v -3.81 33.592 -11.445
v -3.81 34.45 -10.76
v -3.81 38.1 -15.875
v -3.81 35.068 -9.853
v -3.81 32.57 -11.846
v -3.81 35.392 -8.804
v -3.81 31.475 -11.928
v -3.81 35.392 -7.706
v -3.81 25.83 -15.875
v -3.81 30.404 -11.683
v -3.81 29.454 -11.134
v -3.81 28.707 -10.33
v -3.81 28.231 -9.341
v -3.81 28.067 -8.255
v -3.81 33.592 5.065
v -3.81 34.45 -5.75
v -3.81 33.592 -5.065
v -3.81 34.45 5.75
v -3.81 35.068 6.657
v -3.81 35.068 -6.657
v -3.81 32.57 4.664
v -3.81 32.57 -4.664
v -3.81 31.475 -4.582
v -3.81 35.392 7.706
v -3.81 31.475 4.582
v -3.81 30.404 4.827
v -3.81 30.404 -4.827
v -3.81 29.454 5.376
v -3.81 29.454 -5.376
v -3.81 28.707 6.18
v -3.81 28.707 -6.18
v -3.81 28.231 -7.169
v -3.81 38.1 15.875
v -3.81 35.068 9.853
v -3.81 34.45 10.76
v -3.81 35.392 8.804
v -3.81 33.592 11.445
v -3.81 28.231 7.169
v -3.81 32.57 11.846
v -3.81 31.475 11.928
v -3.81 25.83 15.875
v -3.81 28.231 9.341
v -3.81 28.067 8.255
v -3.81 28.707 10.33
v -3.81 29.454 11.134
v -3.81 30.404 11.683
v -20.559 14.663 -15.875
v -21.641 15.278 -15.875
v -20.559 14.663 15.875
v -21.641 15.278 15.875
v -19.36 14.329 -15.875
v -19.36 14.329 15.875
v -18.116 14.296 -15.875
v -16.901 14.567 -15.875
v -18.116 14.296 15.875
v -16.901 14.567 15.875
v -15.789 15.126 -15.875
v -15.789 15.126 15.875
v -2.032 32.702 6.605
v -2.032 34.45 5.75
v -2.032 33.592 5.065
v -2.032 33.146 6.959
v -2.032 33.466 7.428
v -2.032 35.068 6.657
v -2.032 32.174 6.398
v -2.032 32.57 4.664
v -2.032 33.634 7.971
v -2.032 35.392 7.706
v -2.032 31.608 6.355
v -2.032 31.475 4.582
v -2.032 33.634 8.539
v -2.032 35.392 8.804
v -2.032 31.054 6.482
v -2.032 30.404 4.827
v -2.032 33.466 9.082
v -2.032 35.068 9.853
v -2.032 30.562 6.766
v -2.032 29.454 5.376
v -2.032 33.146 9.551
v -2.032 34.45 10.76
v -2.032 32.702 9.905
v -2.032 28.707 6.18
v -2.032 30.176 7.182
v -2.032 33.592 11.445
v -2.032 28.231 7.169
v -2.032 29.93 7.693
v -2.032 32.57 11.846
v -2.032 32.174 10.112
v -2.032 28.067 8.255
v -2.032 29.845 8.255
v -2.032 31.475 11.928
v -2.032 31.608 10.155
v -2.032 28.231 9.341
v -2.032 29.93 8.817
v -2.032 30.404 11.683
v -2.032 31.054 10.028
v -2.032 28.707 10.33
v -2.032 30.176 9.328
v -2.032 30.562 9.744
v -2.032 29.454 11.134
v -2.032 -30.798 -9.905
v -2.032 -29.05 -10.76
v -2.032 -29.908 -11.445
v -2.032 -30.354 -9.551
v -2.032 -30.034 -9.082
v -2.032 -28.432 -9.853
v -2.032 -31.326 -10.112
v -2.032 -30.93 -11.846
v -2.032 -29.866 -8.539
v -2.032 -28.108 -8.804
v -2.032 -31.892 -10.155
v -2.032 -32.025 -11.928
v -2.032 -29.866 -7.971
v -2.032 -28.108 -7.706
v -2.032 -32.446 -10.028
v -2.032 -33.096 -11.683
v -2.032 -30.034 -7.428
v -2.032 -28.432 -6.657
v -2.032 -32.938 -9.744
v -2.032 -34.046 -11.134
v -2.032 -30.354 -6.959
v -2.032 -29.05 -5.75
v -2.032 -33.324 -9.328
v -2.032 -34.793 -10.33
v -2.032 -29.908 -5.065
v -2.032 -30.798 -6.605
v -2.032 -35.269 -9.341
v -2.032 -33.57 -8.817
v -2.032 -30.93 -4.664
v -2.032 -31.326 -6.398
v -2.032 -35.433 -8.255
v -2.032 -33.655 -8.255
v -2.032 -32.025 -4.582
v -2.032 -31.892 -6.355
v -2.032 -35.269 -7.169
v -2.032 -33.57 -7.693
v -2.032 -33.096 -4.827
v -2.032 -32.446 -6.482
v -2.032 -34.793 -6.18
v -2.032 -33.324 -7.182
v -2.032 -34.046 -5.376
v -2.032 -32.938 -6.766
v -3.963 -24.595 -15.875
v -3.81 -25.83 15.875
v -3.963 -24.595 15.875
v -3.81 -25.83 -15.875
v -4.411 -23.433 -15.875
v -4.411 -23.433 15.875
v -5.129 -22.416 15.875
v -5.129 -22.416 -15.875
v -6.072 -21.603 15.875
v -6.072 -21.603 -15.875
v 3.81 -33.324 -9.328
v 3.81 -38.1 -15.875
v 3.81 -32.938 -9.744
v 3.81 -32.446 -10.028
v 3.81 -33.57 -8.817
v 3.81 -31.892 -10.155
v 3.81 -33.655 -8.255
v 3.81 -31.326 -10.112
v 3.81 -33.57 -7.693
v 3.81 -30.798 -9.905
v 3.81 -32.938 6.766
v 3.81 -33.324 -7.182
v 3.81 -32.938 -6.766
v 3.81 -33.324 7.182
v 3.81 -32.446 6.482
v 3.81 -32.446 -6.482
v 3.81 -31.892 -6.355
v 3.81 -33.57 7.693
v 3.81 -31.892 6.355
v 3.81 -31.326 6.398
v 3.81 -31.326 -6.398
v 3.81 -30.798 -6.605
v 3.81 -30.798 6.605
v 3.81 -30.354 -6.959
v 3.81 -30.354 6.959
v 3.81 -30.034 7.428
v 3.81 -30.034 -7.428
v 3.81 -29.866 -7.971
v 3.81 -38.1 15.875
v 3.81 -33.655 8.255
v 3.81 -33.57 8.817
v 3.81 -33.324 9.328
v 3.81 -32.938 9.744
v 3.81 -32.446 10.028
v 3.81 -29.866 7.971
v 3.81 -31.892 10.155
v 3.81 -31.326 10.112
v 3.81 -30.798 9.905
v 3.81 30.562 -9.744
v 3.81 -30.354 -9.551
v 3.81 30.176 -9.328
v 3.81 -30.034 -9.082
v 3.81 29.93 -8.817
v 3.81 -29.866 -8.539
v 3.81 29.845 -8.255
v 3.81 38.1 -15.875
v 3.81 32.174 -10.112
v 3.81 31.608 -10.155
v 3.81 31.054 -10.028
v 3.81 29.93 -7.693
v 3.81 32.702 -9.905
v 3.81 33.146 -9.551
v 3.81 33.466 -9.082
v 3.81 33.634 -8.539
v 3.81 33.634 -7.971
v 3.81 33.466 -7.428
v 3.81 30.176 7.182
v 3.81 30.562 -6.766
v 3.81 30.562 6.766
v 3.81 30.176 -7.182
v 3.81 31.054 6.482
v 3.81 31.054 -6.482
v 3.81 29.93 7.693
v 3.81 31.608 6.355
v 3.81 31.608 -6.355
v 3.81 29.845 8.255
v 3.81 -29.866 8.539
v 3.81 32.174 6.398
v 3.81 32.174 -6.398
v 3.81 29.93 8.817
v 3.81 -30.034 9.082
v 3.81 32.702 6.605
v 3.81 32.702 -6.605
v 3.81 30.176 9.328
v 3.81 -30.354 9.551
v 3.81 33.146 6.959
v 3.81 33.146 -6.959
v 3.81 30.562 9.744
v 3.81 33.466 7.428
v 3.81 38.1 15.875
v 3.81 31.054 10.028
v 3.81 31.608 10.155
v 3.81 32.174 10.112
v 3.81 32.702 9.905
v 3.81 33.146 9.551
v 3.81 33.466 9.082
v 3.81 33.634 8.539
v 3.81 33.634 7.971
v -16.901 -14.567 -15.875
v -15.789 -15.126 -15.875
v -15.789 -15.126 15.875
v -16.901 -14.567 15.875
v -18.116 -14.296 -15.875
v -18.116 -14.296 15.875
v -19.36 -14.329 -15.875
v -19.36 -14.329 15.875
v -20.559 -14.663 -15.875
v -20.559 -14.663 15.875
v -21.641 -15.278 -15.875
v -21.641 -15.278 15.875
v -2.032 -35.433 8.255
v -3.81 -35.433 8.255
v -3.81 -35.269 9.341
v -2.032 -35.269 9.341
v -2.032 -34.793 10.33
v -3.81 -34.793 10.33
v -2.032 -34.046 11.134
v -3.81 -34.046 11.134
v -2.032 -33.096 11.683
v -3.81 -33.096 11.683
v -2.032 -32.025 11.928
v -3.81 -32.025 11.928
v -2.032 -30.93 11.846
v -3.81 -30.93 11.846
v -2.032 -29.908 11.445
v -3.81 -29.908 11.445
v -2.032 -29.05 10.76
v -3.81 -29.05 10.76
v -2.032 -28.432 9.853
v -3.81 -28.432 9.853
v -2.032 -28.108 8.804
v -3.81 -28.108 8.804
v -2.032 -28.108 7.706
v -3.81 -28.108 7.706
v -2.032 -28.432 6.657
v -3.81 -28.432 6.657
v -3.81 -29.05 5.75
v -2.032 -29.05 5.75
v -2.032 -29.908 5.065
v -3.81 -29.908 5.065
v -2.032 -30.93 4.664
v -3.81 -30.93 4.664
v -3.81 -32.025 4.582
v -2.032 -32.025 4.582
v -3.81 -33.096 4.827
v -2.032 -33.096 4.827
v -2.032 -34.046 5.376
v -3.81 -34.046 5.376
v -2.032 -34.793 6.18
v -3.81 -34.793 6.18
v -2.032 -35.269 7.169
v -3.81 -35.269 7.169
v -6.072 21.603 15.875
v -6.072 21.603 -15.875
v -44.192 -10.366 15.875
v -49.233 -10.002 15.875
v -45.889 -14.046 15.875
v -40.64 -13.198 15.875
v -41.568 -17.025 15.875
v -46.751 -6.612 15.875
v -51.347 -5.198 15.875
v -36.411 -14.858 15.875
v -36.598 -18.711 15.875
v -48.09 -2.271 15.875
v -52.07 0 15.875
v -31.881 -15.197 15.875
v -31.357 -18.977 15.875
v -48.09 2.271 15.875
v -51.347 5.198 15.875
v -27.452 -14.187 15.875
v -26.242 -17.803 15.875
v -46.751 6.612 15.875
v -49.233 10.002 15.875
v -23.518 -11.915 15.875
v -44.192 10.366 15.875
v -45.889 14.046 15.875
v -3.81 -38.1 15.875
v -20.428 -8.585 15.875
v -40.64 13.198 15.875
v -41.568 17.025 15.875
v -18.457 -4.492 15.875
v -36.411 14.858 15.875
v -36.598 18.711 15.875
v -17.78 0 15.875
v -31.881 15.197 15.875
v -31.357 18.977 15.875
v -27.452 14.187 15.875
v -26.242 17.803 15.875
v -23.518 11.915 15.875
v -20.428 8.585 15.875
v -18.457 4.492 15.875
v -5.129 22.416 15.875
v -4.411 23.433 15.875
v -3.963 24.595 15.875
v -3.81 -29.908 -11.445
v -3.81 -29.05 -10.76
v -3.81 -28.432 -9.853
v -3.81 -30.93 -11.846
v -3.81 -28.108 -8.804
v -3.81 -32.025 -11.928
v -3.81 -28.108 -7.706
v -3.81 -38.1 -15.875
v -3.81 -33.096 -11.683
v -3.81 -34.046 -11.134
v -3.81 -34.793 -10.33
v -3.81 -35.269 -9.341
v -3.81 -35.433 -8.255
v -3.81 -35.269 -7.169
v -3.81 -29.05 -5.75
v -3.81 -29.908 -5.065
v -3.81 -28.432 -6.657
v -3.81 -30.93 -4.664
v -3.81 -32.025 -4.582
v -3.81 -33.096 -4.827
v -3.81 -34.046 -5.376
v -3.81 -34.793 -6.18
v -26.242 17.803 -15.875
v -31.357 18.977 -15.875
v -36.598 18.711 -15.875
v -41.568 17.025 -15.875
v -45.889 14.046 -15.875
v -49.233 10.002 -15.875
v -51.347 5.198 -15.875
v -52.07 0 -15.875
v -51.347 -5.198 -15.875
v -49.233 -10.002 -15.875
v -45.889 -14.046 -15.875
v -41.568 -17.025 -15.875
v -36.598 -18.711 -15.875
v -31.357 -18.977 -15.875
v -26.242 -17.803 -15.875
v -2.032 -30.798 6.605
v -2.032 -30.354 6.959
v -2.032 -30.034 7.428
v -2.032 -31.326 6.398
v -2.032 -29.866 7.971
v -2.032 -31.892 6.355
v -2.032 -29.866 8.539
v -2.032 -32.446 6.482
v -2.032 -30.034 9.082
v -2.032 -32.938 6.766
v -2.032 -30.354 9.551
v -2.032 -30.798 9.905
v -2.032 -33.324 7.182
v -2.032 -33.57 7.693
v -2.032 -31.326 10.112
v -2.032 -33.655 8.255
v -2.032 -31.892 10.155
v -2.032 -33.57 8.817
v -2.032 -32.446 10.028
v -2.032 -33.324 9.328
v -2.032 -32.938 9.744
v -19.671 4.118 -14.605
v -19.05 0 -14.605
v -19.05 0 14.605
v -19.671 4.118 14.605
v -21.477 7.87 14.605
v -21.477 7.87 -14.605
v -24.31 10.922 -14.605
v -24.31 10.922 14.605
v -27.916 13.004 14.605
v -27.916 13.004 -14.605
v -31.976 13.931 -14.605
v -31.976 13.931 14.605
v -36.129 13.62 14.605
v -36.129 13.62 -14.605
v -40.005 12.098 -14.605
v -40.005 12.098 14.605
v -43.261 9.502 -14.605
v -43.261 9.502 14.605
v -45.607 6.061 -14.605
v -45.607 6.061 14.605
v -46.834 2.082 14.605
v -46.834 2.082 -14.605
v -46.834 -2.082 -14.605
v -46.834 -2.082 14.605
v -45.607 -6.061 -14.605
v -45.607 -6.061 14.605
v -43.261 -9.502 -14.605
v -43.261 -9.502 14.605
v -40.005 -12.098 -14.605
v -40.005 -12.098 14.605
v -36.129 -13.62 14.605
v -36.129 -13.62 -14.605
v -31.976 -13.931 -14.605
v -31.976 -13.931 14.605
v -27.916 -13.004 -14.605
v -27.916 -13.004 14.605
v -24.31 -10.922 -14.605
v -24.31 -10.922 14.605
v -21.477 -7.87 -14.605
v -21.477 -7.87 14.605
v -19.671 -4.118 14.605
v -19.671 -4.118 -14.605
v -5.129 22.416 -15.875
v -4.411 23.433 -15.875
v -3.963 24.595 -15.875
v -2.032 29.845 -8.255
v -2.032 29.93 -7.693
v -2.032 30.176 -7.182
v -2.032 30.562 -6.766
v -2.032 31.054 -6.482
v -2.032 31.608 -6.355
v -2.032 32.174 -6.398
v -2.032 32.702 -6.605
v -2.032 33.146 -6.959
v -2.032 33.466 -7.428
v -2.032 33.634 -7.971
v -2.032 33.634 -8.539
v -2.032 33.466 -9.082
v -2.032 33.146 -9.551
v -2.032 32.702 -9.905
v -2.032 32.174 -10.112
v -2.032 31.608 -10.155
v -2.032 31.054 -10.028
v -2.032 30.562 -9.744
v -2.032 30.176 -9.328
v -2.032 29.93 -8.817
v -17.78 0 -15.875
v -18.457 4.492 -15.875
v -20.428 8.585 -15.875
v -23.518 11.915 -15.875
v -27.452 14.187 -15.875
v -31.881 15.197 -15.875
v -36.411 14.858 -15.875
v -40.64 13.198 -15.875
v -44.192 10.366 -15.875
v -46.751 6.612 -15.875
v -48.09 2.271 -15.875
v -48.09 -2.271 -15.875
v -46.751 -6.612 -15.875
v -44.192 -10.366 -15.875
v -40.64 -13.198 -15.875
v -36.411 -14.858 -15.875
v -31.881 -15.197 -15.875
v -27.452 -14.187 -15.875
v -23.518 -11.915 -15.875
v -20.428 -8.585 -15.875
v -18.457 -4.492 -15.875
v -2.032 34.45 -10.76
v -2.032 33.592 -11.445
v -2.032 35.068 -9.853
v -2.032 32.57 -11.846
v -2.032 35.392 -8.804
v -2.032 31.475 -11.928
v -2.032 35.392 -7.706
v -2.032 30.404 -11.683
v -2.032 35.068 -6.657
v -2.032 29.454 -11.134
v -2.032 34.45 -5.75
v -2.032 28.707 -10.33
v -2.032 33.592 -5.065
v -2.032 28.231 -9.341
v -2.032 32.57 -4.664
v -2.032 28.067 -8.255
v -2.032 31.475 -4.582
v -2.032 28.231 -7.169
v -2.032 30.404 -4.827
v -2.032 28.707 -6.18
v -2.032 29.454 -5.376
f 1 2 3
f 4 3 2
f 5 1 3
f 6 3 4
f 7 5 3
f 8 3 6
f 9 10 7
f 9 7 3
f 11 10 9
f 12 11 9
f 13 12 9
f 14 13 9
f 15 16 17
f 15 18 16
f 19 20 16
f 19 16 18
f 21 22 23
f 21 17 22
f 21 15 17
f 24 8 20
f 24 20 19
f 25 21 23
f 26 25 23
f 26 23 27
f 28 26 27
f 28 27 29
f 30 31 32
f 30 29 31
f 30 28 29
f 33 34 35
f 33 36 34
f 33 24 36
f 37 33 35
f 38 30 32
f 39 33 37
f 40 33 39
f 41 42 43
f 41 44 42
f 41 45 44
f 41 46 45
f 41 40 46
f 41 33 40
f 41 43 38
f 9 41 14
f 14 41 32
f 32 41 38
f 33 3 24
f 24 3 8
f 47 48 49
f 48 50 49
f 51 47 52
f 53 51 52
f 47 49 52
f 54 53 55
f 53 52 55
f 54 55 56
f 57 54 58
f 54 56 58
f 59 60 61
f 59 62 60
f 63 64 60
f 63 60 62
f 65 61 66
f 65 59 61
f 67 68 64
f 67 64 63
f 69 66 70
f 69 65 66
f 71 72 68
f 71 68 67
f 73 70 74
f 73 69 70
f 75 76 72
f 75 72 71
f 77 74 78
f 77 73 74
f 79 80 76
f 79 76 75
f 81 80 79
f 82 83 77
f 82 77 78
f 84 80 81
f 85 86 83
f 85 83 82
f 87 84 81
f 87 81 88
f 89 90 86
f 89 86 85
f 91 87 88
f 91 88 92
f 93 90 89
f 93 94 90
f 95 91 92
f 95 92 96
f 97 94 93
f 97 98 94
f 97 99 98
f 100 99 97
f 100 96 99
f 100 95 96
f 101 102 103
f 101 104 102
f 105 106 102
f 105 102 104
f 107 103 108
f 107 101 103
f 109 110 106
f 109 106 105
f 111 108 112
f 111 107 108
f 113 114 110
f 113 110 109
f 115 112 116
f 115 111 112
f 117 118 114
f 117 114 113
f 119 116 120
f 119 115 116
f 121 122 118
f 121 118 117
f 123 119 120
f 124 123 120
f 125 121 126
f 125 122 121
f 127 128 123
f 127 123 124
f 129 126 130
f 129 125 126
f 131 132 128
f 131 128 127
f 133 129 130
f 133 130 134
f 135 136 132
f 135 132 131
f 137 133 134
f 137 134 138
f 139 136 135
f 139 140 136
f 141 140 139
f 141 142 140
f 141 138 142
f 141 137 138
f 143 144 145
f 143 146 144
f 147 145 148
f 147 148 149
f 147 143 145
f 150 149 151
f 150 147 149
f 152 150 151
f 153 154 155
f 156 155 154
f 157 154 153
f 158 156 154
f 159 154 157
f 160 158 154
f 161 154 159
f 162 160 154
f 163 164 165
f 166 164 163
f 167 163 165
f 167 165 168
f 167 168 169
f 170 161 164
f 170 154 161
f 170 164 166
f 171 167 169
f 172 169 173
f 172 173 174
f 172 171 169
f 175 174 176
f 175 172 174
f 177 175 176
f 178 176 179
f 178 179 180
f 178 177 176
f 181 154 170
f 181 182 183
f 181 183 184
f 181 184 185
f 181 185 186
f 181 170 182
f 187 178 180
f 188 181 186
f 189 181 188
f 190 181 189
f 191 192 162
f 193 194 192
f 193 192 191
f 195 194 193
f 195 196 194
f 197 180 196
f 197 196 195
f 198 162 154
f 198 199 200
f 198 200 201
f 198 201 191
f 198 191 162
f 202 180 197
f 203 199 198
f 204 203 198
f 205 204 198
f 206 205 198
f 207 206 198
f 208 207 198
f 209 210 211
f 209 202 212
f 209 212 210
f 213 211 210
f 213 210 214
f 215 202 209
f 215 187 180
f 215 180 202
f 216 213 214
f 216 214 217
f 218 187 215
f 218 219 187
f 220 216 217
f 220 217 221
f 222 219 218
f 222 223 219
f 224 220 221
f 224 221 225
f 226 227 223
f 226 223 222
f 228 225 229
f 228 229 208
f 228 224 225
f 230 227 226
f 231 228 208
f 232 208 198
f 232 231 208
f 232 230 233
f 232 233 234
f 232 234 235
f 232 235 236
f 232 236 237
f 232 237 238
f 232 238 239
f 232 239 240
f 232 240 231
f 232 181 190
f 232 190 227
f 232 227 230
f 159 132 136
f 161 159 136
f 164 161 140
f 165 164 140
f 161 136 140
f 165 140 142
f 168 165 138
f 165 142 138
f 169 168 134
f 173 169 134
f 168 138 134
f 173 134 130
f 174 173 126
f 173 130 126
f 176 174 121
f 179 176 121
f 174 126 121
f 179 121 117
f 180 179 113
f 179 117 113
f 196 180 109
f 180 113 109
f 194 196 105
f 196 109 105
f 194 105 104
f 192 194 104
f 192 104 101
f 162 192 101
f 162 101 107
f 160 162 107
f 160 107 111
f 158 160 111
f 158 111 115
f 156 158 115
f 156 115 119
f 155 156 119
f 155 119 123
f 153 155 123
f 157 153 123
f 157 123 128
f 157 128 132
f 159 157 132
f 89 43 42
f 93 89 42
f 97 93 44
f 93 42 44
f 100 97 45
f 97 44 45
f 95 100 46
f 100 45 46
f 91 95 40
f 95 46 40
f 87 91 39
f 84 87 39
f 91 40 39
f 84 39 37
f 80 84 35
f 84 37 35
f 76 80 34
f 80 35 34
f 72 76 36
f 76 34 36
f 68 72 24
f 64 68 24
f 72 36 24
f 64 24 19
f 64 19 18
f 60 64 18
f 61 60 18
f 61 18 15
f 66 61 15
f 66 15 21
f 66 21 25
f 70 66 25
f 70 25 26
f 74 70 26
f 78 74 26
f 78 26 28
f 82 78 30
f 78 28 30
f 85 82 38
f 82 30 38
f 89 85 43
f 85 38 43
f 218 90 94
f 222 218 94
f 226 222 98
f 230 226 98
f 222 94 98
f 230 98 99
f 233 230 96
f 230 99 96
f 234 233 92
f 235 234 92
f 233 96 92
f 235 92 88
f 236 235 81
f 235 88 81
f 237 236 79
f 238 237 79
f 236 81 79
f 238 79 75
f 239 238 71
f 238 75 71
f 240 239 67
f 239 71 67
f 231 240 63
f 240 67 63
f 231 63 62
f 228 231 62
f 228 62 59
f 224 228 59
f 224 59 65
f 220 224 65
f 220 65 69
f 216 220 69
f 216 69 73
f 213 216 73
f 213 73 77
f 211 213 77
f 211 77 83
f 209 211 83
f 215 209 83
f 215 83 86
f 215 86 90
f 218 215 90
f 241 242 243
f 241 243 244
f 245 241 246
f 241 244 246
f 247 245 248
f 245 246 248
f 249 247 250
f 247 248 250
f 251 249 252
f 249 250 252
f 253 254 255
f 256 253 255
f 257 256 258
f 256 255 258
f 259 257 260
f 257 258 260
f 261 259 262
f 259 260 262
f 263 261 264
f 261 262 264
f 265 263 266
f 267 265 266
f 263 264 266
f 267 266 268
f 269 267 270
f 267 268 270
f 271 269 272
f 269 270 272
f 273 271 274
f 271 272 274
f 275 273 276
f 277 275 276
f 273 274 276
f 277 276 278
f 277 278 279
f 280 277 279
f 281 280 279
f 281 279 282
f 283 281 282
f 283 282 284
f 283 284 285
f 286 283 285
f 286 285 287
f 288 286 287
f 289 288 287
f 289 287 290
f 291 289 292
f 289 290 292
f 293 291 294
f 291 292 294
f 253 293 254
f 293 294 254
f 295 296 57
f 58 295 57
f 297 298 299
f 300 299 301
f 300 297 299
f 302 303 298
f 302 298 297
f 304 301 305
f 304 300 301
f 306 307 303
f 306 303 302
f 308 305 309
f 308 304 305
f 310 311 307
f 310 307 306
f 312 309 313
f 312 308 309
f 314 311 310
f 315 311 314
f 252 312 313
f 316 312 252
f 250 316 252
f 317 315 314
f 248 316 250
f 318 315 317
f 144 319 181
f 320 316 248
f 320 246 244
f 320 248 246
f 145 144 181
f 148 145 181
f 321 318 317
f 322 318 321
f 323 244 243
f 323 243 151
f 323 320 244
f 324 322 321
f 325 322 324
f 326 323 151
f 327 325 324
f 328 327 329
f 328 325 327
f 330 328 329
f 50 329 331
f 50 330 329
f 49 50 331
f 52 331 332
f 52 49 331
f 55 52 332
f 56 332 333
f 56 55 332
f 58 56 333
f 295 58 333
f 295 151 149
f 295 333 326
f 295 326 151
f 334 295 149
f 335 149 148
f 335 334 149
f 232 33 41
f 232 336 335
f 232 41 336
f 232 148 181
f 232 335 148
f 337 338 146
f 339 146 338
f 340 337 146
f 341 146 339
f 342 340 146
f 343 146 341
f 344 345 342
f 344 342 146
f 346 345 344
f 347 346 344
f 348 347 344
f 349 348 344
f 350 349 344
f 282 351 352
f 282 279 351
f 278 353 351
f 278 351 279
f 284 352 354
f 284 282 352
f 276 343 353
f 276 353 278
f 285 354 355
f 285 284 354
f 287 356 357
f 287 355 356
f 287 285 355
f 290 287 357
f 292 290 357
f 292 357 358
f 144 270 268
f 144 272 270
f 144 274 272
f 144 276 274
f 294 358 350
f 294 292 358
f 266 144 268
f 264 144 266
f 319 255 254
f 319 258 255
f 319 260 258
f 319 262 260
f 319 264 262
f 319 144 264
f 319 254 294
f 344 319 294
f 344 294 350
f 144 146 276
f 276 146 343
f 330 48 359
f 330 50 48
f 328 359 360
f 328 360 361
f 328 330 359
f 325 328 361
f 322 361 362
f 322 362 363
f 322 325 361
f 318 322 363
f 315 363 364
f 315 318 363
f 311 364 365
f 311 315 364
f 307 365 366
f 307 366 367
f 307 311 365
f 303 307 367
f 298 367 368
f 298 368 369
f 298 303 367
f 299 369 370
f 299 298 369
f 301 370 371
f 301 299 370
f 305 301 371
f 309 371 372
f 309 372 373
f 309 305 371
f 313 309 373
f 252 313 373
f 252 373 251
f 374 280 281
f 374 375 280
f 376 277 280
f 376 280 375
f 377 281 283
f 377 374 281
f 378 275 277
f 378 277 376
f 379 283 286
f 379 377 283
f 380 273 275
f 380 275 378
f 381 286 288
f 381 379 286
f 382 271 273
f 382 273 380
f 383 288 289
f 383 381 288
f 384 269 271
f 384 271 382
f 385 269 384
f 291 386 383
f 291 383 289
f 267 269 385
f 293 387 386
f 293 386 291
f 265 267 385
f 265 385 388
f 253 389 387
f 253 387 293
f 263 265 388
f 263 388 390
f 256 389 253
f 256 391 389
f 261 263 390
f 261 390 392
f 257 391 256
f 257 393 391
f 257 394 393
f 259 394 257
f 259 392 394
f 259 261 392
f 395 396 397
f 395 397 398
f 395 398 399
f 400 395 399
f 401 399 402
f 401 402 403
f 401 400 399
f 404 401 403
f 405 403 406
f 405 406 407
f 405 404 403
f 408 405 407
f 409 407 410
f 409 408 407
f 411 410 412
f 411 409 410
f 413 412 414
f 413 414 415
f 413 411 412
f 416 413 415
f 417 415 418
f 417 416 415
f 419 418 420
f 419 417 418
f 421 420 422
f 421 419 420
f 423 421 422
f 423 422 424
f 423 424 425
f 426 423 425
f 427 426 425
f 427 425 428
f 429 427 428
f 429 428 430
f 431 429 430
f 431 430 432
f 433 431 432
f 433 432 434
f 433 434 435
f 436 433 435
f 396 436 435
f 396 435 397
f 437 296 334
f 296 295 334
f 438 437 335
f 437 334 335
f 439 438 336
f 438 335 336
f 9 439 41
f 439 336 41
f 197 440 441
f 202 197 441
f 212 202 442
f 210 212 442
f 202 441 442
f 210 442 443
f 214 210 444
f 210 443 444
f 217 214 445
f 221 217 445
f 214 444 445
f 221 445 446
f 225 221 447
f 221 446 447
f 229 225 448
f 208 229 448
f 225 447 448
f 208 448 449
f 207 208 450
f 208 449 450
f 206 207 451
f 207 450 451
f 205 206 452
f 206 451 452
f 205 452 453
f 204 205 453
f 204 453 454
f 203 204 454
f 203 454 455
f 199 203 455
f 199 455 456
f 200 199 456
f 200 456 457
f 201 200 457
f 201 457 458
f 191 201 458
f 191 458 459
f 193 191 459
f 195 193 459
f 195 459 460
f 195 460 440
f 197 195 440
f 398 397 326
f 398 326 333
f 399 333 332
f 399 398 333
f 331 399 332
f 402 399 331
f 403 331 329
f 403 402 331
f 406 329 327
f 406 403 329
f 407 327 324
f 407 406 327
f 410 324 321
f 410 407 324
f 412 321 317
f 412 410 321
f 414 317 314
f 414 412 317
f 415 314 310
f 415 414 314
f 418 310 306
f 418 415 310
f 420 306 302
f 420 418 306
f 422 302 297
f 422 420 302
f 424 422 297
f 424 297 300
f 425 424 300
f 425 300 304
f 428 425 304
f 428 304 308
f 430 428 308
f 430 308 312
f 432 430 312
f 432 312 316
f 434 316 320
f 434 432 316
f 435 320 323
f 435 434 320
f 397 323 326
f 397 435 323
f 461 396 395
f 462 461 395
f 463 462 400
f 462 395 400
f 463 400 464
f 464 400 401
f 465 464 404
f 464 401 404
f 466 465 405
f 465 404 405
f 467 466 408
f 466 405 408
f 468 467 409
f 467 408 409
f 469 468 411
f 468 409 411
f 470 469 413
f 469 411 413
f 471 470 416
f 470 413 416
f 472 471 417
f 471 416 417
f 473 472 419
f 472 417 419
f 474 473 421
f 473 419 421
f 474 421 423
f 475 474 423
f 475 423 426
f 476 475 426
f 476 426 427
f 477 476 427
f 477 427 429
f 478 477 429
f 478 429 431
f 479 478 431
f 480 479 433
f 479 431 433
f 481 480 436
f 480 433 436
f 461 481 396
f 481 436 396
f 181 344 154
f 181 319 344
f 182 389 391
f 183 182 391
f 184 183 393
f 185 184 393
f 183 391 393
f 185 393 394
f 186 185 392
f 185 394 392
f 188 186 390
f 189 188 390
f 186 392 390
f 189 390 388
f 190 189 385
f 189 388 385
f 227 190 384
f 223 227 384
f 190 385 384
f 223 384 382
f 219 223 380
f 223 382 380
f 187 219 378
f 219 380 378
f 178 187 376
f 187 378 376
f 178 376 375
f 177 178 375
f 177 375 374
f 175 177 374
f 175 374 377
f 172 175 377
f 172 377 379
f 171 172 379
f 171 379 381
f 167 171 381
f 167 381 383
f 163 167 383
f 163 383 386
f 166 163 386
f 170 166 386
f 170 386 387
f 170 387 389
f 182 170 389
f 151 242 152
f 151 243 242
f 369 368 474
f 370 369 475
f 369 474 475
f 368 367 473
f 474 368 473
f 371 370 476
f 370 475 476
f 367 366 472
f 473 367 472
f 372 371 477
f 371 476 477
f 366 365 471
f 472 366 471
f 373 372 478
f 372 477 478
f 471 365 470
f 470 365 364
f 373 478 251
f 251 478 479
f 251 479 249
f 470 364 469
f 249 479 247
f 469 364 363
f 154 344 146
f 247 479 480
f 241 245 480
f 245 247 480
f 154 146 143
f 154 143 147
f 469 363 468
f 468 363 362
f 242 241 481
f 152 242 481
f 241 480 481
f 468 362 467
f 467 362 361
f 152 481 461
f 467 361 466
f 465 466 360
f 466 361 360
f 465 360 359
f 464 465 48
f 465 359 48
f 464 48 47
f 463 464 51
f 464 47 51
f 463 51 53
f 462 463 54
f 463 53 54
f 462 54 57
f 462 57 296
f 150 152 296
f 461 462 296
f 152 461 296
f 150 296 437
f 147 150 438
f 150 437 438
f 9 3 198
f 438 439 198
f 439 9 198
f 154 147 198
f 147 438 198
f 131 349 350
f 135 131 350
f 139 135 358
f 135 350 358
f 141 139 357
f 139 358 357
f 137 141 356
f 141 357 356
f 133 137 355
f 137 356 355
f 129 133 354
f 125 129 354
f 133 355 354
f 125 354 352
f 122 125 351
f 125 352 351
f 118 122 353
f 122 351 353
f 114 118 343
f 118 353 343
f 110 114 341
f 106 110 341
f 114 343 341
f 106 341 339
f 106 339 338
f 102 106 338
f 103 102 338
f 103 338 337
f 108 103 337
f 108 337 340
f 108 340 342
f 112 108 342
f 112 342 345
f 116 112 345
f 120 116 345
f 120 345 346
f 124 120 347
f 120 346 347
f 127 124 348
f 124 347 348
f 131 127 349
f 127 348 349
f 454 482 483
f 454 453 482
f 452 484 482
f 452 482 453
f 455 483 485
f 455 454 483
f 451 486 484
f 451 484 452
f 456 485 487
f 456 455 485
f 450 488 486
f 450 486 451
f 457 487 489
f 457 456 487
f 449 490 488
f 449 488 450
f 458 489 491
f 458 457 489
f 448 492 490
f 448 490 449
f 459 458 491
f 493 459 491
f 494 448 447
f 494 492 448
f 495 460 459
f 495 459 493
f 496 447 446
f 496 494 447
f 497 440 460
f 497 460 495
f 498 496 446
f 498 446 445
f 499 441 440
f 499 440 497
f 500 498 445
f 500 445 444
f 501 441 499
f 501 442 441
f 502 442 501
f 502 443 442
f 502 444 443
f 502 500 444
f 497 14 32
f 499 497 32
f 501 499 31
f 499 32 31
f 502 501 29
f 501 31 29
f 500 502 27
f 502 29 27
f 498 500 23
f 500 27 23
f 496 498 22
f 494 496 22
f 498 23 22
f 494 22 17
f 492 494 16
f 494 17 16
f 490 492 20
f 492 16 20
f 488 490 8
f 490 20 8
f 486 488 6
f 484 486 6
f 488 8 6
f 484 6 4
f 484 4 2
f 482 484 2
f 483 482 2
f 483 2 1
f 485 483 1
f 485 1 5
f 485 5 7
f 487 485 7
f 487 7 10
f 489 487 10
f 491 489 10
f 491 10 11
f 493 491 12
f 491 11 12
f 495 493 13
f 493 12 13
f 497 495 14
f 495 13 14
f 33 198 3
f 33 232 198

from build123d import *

# Parameters (mm, degrees)
F0_R     = 13.97
F1_DEPTH = 15.875
F2_R     = 5.08
F3_SIZE2 = 1.27
F3_SIZE  = 1.27
F4_R     = 3.683
F5_DEPTH = 1.778
F6_R     = 1.905
F7_DEPTH = 7.621


with BuildPart() as f1:
    # F0 (on Top) → F1 (new body, symmetric)
    with BuildSketch(Plane.XY):
        with BuildLine():
            Line((3.81, 38.1), (-3.81, 38.1))
            Line((-3.81, 38.1), (-3.81, 23.11151))
            Line((-3.81, 23.11151), (-19.05, 12.95151))
            ThreePointArc((-19.05, 12.95151), (-52.07, 0), (-19.05, -12.95151))
            Line((-19.05, -12.95151), (-3.81, -23.11151))
            Line((-3.81, -23.11151), (-3.81, -38.1))
            Line((-3.81, -38.1), (3.81, -38.1))
            Line((3.81, -38.1), (3.81, 38.1))
        make_face()
        with Locations((-33.02, 0)):
            Circle(F0_R, mode=Mode.SUBTRACT)
    extrude(amount=F1_DEPTH, both=True)

    # F2
    f2_edges = [f1.edges().sort_by_distance(p)[0] for p in [
        (-19.05, -12.95151, 0),
        (-3.81, -23.11151, 0),
        (-3.81, 23.11151, 0),
        (-19.05, 12.95151, 0),
    ]]
    fillet(f2_edges, radius=F2_R)

    # F3
    f3_edges = [f1.edges().sort_by_distance(p)[0] for p in [
        (-46.99, 0, 15.875),
        (-46.99, 0, -15.875),
    ]]
    chamfer(f3_edges, length=F3_SIZE, length2=F3_SIZE2)

    # F4 (on face) → F5 (cut)
    with BuildSketch(Plane(origin=(-3.81, 0, 0), x_dir=(0, -1, 0), z_dir=(-1, 0, 0))):
        with Locations((-31.75, 8.255)):
            Circle(F4_R)
        with Locations((-31.75, -8.255)):
            Circle(F4_R)
        with Locations((31.75, 8.255)):
            Circle(F4_R)
        with Locations((31.75, -8.255)):
            Circle(F4_R)
    extrude(amount=-F5_DEPTH, mode=Mode.SUBTRACT)

    # F6 (on face) → F7 (cut, through all)
    with BuildSketch(Plane(origin=(-3.81, 0, 0), x_dir=(0, -1, 0), z_dir=(-1, 0, 0))):
        with Locations((31.75, 8.255)):
            Circle(F6_R)
        with Locations((-31.75, 8.255)):
            Circle(F6_R)
        with Locations((31.75, -8.255)):
            Circle(F6_R)
        with Locations((-31.75, -8.255)):
            Circle(F6_R)
    extrude(amount=-F7_DEPTH, mode=Mode.SUBTRACT)


solid = f1.part
